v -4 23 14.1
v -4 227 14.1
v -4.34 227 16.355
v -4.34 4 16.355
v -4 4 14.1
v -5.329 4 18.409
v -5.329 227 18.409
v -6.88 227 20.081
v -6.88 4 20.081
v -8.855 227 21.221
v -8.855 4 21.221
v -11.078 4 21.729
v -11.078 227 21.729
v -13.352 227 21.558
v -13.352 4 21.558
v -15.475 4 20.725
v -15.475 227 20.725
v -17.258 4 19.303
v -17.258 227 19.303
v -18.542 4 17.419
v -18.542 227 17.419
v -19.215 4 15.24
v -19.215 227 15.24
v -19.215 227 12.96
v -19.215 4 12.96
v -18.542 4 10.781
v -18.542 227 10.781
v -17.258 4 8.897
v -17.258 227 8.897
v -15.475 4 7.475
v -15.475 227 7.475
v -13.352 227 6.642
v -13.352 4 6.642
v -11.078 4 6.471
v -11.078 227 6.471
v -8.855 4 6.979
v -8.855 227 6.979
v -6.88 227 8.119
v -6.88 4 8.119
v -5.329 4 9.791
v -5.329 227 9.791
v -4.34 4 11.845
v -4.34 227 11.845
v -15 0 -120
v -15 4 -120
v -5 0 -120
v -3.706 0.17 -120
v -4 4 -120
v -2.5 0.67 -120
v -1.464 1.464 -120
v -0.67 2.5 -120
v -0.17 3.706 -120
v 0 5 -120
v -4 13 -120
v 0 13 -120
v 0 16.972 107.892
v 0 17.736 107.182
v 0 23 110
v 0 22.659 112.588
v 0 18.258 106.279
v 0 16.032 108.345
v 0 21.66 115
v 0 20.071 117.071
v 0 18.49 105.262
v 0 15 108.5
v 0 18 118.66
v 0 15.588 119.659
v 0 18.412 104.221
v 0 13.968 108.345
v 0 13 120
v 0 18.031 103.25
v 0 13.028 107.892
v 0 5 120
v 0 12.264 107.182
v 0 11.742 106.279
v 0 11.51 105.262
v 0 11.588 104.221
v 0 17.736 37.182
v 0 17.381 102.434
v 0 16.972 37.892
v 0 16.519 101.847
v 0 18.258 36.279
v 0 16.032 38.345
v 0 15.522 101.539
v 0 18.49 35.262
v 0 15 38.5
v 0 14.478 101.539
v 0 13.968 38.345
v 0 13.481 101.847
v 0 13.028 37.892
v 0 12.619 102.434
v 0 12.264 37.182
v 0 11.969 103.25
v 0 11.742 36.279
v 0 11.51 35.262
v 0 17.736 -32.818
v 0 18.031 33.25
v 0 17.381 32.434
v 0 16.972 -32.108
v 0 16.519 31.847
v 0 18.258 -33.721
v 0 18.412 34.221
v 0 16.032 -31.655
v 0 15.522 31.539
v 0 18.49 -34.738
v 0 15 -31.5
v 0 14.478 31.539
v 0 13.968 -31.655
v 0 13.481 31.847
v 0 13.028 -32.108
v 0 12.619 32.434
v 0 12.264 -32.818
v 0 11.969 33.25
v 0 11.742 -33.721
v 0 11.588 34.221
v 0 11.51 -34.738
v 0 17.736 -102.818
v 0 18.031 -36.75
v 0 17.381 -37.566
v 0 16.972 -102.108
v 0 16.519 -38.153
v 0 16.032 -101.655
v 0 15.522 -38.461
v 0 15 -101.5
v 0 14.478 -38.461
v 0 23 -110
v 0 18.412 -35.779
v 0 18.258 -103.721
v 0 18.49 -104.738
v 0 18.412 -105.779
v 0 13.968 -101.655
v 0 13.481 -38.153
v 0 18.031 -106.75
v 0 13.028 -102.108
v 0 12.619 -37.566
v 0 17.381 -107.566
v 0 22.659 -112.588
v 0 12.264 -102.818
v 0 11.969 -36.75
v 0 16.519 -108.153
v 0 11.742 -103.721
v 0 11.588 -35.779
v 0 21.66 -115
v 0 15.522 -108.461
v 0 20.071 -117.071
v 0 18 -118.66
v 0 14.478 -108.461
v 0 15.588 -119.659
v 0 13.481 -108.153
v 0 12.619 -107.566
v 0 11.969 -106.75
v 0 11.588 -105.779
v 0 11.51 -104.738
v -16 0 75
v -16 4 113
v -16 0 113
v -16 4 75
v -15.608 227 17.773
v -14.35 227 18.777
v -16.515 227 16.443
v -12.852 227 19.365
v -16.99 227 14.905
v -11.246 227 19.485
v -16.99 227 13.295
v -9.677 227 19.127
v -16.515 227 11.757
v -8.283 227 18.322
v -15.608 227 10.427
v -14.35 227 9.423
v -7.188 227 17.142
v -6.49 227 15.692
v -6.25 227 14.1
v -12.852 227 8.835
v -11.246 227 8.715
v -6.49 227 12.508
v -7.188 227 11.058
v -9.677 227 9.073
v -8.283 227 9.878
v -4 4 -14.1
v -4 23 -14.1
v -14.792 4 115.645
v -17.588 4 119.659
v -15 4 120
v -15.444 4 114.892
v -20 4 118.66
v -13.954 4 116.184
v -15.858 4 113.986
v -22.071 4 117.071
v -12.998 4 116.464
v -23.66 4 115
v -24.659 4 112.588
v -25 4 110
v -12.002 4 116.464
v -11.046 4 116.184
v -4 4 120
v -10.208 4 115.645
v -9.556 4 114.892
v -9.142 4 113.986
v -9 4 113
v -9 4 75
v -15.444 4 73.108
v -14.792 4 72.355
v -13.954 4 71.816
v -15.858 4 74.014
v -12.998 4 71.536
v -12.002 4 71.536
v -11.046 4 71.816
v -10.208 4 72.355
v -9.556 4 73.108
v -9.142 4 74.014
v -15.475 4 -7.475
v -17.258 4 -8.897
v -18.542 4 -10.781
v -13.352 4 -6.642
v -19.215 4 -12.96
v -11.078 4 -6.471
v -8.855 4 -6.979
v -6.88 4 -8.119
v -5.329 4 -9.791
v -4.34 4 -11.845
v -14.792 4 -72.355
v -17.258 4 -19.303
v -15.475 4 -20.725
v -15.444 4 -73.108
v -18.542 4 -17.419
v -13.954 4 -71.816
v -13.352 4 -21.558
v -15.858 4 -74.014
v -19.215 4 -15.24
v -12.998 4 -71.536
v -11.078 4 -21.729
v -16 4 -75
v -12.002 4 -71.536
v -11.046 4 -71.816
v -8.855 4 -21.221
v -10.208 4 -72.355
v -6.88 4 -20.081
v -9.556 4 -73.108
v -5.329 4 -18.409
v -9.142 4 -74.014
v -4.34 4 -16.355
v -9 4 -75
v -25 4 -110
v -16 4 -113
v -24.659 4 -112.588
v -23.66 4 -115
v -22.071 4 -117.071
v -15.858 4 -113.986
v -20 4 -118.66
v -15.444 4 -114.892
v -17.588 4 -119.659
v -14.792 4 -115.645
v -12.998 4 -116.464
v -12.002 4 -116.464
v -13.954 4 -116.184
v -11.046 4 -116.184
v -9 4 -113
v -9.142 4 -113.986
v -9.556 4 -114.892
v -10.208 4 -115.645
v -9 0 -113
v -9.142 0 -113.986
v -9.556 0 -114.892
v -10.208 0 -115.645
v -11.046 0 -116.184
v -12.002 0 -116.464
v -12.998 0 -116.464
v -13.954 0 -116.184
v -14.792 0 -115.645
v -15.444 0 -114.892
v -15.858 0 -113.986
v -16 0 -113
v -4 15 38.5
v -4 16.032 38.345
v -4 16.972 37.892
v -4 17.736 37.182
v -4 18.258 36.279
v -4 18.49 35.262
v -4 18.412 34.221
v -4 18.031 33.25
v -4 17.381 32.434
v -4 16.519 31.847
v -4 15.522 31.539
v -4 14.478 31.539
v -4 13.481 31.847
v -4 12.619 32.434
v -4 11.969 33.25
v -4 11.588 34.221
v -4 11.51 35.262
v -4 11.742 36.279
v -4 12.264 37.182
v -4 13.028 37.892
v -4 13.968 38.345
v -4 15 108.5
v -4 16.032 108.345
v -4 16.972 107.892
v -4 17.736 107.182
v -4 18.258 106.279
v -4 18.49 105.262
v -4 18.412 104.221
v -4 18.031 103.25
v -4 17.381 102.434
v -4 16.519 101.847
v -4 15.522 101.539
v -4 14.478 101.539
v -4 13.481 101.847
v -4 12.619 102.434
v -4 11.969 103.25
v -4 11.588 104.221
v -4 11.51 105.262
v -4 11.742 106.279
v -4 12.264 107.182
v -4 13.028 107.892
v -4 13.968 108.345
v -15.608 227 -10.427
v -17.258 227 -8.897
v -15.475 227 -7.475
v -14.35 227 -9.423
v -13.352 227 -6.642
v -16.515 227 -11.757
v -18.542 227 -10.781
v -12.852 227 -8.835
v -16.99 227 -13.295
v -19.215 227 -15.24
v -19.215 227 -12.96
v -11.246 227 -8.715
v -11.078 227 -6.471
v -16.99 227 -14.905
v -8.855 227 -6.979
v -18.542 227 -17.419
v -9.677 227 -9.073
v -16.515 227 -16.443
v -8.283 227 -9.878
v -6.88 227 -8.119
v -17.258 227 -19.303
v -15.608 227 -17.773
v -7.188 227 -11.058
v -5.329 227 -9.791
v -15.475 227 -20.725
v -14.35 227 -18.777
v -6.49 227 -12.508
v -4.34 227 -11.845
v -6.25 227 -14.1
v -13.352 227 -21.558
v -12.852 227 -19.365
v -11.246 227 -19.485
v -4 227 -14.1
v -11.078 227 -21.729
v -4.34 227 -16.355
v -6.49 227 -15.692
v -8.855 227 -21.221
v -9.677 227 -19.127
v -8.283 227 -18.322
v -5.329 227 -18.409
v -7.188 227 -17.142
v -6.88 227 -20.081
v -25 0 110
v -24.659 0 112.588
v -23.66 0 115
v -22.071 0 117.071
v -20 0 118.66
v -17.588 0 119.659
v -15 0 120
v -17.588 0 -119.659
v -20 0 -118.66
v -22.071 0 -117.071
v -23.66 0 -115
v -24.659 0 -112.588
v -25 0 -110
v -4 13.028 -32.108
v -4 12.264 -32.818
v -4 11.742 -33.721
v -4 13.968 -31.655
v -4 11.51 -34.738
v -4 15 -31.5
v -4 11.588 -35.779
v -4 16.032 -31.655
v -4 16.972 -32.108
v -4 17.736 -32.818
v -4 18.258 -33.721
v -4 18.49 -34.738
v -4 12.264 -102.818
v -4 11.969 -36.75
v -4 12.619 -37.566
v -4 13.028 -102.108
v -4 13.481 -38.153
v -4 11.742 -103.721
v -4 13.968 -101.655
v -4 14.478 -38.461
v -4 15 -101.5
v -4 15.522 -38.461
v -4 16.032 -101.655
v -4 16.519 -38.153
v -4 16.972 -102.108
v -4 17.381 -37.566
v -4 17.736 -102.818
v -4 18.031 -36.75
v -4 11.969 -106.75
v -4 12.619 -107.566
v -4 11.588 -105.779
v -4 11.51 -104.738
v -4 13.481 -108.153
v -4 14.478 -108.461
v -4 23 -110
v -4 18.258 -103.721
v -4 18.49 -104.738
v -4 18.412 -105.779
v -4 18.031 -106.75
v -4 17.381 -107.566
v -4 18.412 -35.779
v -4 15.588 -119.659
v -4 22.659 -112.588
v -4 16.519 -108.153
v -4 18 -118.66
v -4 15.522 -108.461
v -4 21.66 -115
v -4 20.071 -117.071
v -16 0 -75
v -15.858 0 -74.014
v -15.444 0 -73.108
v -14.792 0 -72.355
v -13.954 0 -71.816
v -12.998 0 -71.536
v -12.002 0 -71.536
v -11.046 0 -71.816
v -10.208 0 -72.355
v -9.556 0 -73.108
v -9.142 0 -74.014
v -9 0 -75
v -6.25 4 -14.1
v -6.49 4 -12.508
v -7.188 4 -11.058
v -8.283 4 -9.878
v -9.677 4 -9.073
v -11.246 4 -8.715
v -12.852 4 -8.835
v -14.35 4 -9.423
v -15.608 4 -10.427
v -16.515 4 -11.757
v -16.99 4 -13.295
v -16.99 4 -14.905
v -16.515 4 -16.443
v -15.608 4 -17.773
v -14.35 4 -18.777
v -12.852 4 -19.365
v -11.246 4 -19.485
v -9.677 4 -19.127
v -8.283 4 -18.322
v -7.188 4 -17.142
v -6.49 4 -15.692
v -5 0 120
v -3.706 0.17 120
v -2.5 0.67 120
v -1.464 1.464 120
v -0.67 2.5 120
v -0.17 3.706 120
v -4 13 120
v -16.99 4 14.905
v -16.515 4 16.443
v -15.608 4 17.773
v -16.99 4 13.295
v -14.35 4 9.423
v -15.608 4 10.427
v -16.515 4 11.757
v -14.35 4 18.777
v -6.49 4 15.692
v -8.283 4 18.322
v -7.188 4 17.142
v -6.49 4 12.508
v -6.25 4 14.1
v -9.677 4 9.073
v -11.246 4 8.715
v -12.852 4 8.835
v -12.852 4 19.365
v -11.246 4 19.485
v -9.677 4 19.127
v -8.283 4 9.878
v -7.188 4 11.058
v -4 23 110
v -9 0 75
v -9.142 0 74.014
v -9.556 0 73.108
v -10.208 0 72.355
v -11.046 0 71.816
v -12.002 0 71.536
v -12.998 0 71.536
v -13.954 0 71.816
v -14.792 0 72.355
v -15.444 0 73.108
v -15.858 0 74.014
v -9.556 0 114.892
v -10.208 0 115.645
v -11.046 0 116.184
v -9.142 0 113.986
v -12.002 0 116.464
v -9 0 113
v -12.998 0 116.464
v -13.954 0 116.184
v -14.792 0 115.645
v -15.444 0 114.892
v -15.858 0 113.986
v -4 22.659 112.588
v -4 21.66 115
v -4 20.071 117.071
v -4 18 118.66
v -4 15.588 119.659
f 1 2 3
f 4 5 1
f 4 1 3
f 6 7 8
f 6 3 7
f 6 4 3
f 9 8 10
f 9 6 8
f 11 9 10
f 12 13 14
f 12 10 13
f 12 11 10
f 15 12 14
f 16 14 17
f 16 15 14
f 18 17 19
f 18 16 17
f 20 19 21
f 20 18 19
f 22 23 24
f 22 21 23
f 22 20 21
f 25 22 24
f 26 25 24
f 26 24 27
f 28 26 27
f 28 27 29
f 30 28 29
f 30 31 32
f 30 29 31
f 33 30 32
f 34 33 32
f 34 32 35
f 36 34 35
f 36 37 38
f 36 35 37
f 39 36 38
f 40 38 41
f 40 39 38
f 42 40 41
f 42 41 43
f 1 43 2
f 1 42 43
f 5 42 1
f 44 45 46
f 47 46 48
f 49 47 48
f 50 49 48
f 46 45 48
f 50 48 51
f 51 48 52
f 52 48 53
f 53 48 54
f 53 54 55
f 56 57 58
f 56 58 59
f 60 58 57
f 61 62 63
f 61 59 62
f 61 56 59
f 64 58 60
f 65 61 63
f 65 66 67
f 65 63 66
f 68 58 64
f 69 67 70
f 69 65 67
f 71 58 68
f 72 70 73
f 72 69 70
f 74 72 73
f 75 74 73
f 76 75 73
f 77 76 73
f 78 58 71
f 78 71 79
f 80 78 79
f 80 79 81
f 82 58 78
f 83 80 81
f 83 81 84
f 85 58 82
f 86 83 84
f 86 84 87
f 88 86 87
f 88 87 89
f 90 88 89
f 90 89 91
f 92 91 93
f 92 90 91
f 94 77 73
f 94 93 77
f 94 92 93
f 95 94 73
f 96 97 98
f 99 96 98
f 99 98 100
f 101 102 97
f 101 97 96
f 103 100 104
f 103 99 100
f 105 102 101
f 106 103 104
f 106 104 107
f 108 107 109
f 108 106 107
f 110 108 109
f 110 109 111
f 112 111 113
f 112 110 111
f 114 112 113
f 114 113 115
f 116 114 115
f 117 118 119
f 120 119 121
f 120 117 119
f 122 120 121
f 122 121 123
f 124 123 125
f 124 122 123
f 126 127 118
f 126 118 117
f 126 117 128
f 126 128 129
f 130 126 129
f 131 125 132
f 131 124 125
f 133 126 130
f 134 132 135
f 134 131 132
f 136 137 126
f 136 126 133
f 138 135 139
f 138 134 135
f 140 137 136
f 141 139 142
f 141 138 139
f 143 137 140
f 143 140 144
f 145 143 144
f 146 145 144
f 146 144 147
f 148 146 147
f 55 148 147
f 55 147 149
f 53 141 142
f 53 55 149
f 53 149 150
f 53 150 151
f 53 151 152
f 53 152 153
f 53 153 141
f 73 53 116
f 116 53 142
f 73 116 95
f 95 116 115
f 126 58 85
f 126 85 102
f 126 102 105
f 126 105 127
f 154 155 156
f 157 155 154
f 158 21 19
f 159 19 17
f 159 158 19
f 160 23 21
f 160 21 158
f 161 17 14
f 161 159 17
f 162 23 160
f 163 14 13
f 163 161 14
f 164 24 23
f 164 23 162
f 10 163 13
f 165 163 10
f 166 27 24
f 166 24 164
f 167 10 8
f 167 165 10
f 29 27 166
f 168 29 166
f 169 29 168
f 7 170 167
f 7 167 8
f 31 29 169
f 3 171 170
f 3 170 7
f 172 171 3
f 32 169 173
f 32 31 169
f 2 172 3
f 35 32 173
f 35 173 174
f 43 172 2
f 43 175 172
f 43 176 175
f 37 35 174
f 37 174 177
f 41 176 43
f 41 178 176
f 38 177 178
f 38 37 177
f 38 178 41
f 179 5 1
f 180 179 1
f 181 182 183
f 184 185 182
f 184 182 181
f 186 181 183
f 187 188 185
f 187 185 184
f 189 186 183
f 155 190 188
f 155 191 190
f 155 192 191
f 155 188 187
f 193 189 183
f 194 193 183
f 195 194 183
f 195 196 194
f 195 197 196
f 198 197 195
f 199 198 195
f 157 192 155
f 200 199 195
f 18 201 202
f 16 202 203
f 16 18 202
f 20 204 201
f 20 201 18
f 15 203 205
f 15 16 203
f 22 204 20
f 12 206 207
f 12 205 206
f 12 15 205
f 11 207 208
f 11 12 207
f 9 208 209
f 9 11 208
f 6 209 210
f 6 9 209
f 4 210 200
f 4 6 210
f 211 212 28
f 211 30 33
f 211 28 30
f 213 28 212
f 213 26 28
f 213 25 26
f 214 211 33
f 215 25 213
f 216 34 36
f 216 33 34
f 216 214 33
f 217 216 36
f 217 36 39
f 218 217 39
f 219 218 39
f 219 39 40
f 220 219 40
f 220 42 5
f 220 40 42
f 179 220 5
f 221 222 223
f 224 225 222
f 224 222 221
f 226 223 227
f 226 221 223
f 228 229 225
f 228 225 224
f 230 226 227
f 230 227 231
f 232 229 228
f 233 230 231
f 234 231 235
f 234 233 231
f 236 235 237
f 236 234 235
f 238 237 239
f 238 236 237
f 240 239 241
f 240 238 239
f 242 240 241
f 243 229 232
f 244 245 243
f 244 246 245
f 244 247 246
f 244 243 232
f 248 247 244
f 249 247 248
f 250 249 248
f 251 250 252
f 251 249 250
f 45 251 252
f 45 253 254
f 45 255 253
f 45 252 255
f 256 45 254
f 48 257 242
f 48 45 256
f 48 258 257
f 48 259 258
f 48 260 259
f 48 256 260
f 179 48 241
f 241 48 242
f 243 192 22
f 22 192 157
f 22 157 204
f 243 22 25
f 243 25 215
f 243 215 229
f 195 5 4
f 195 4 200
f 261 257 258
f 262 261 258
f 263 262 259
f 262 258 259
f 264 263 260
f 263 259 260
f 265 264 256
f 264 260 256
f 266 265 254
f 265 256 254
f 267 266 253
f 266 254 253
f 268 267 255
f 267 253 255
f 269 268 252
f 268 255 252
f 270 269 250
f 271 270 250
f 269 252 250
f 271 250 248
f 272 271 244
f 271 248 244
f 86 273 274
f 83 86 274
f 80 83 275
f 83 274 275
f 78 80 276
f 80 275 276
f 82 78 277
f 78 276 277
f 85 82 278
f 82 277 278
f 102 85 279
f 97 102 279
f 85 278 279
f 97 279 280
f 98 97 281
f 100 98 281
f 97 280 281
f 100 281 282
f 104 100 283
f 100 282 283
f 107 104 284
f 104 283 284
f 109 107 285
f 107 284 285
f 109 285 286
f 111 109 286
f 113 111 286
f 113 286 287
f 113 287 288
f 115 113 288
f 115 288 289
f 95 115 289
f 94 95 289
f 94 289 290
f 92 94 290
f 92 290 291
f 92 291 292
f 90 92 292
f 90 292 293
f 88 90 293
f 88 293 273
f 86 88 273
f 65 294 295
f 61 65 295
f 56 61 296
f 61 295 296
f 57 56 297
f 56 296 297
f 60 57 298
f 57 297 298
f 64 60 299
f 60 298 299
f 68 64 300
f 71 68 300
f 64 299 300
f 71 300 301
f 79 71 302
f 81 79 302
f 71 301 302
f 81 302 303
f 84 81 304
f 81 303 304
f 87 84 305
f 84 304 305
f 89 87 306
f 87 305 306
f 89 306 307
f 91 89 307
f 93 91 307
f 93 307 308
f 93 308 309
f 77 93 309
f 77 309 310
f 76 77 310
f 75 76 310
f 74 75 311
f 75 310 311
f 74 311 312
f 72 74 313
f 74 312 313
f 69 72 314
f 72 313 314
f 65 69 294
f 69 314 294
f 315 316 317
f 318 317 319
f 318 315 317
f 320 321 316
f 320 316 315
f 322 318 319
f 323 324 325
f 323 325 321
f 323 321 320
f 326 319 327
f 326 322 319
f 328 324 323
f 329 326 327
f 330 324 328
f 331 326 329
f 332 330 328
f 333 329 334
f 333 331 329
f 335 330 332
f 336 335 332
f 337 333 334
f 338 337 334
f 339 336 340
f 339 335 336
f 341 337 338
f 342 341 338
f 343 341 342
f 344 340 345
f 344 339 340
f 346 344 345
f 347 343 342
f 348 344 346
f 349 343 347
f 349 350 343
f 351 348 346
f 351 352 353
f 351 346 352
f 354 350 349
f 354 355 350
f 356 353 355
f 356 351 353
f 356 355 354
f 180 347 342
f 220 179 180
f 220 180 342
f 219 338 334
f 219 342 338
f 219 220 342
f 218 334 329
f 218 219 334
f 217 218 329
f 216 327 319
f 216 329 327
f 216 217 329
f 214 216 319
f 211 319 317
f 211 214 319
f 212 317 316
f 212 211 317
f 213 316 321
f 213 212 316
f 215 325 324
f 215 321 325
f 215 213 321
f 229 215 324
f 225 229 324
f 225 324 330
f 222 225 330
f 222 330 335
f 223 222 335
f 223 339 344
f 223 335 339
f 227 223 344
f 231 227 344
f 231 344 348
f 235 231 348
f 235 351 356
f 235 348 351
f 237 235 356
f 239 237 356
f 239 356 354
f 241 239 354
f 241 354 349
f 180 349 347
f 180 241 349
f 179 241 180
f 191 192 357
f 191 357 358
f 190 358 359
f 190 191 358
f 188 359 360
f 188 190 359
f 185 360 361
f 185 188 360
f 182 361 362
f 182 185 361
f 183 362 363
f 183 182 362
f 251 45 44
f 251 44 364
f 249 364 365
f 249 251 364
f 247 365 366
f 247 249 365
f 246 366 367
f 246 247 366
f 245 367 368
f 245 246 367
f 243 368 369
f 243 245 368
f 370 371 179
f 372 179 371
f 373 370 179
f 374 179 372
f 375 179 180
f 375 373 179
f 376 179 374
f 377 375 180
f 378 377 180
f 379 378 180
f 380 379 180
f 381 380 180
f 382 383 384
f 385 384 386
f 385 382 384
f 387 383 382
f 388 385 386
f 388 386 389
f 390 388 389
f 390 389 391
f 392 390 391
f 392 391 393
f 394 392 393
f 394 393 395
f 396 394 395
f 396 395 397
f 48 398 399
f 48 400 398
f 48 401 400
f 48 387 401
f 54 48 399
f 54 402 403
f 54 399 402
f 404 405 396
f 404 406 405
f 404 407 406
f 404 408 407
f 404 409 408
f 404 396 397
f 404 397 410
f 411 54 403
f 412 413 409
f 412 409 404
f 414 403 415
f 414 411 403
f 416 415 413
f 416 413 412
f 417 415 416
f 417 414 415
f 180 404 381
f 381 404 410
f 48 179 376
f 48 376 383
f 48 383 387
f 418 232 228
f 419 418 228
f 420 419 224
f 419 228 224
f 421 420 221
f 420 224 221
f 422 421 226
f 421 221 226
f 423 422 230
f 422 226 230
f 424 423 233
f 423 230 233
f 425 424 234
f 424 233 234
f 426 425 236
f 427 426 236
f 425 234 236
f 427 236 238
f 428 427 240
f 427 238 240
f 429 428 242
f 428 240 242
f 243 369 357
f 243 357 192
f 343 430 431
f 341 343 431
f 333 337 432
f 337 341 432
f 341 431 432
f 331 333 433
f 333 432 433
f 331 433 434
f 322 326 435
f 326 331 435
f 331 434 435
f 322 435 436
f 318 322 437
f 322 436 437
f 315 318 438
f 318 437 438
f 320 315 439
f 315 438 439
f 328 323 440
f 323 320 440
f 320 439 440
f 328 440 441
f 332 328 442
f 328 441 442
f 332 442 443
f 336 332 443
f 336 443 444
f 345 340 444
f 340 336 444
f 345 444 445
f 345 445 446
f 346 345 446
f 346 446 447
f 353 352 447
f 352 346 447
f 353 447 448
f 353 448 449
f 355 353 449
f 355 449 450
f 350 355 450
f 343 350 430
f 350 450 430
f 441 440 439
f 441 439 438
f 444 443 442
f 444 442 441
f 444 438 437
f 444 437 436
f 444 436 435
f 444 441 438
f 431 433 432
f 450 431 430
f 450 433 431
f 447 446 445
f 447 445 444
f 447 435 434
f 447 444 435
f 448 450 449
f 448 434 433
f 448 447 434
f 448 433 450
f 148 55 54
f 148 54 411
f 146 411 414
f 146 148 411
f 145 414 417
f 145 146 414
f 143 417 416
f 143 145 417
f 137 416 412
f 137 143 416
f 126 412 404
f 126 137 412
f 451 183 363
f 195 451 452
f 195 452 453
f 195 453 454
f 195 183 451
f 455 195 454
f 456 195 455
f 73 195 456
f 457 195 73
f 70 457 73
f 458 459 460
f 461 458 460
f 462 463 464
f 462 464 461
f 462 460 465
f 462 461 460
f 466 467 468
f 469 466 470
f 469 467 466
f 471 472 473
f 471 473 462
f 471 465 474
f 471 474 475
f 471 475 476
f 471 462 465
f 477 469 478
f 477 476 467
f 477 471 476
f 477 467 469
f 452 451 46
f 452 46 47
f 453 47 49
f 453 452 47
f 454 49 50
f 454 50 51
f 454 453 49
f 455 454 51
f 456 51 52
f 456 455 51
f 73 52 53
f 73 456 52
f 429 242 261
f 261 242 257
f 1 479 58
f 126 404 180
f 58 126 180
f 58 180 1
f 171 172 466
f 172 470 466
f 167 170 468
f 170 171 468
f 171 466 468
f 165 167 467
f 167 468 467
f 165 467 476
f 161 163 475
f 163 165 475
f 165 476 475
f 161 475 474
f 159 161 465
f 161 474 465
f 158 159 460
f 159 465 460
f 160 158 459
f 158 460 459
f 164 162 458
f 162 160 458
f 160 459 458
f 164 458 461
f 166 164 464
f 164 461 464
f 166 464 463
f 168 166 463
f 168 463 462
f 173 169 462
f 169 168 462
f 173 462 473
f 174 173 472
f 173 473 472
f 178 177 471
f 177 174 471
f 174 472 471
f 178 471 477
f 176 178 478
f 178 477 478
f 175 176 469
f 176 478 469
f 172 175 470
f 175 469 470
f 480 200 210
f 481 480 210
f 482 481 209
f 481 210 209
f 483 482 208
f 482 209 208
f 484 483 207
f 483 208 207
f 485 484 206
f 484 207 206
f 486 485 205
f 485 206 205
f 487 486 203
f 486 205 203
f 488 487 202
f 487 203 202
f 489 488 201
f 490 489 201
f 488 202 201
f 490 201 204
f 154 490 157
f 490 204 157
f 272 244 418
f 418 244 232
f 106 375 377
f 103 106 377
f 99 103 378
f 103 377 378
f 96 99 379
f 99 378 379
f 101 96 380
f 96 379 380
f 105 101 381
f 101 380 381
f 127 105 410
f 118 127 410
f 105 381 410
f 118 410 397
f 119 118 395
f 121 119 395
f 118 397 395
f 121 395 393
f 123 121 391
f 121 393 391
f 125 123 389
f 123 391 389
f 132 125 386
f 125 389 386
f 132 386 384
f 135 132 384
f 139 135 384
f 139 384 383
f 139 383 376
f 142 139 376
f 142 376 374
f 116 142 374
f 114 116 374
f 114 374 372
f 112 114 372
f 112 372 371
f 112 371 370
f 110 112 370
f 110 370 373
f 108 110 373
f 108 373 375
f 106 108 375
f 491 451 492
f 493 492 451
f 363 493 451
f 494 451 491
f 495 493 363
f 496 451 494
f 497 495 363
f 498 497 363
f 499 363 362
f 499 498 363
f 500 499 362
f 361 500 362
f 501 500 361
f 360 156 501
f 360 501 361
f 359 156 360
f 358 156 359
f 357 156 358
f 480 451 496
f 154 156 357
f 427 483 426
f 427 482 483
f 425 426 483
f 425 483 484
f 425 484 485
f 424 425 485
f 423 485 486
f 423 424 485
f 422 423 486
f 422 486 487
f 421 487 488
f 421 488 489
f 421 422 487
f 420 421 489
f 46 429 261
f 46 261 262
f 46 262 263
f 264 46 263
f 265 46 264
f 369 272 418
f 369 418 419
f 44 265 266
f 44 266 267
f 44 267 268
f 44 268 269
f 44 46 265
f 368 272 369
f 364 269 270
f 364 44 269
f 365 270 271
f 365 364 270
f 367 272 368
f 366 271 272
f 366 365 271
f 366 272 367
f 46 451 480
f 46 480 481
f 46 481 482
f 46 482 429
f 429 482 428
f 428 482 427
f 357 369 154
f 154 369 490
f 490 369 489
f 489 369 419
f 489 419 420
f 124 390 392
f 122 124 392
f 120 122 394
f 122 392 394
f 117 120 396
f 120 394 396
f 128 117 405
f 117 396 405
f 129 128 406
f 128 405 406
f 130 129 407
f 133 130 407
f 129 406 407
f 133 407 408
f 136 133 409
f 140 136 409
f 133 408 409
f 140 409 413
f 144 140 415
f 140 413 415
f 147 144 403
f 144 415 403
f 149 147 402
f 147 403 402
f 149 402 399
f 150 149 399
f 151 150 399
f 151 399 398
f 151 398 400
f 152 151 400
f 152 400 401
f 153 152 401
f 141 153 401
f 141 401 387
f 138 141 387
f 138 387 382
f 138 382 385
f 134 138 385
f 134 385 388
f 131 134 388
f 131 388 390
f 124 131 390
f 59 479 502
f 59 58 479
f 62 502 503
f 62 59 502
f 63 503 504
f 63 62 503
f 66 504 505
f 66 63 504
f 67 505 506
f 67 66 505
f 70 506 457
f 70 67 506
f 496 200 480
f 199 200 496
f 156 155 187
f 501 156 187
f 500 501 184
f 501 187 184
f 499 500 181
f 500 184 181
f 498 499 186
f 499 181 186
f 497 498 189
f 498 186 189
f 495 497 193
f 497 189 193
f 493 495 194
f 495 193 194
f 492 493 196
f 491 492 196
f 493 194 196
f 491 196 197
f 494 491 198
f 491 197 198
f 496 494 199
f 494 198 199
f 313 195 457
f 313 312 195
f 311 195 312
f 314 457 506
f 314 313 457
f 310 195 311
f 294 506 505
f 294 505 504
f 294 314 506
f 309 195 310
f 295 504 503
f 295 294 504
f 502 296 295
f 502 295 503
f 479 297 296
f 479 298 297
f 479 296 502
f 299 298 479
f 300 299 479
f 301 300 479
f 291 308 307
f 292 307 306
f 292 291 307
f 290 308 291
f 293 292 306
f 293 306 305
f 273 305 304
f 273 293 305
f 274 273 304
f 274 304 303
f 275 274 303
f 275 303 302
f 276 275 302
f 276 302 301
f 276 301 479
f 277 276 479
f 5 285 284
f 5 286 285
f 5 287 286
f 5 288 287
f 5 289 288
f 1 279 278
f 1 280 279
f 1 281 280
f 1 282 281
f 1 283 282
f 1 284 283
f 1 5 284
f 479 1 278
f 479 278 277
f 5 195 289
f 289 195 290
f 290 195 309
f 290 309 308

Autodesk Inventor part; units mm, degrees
ref_plane "YZ Plane" through (0, 0, 0) normal (1, 0, 0) x (0, 1, 0)
ref_plane "XZ Plane" through (0, 0, 0) normal (0, 1, 0) x (-1, 0, 0)
ref_plane "XY Plane" through (0, 0, 0) normal (0, 0, 1) x (1, 0, 0)
sketch "Sketch1" plane through (0, 0, 0) normal (0, 0, 1) x (1, 0, 0)
  line L0 (0, 0) -> (-25, 0)
  line L1 (-25, 0) -> (-25, 4)
  line L2 (-25, 4) -> (-4, 4)
  line L3 (-4, 4) -> (-4, 23)
  line L4 (-4, 23) -> (0, 23)
  line L5 (0, 23) -> (0, 0)
  dimension "d0" = 25
  dimension "d1" = 4
  dimension "d2" = 23
extrude "Extrusion1" add sketch "Sketch1" along normal mid plane 240
sketch "Sketch2" plane through (-4, 4, 120) normal (-1, 0, 0) x (0, 0, 1)
  circle A0 centre (-225, 11) radius 3.5
  line L0 (-240, 0) -> (-240, 19) projected
  line L1 (-240, 19) -> (0, 19) projected
  circle A1 centre (-155, 11) radius 3.5
  circle A2 centre (-85, 11) radius 3.5
  circle A3 centre (-15, 11) radius 3.5
  line L2 (0, 19) -> (0, 0) projected
  point P0 (-120, -4)
  dimension "d5" = 7
  dimension "d6" = 15
  dimension "d7" = 8
  dimension "d8" = 15
  dimension "d9" = 70
  dimension "d10" = 70
extrude "Extrusion2" cut sketch "Sketch2" against normal blind 10
sketch "Sketch3" plane through (-25, 4, 120) normal (0, 1, 0) x (1, 0, 0)
  circle A0 centre (12.5, 7) radius 3.5
  line L0 (0, 240) -> (0, 0) projected
  line L1 (21, 0) -> (0, 0) projected
  circle A1 centre (12.5, 45) radius 3.5
  line L2 (16, 45) -> (16, 7)
  line L3 (9, 7) -> (9, 45)
  line L4 (21, 240) -> (21, 0) construction
  line L5 (21, 120) -> (0, 120) construction
  circle A2 centre (12.5, 233) radius 3.5
  circle A3 centre (12.5, 195) radius 3.5
  line L6 (16, 195) -> (16, 233)
  line L7 (9, 233) -> (9, 195)
  point P0 (25, 120)
  dimension "d13" = 7
  dimension "d14" = 12.5
  dimension "d15" = 7
  dimension "d16" = 38
extrude "Extrusion3" cut sketch "Sketch3" against normal blind 10
fillet "Fillet1" radius 5 1 edges at (0, 0, 0)
fillet "Fillet2" radius 10 4 edges at (-2, 23, -120) (-25, 2, -120) (-25, 2, 120) (-2, 23, 120)
sketch "Sketch4" plane through (-4, 4, 120) normal (0, 1, 0) x (1, 0, 0)
  line L0 (4, 120) -> (-21, 120) construction
  line L1 (-21, 230) -> (-21, 10) construction
  line L2 (0, 230) -> (0, 10) projected
  circle A0 centre (-7.65, 105.9) radius 7.65
  circle A1 centre (-7.65, 134.1) radius 7.65
  line L3 (-7.65, 141.75) -> (-7.65, 98.25) construction
  circle A2 centre (-7.65, 134.1) radius 5.4
  circle A3 centre (-7.65, 105.9) radius 5.4
  line L4 (4, 10) -> (4, 230) construction
  point P0 (-7.65, 120)
  point P1 (4, 120)
  dimension "d21" = 15.3
  dimension "d22" = 10.8
  dimension "d23" = 10.8
  dimension "d24" = 43.5
extrude "Extrusion4" add sketch "Sketch4" along normal blind 223
equation "\"d8\" = d6"
equation "\"d10\" = d9"
properties part number "beugel armsteun" material "Stainless Steel"
